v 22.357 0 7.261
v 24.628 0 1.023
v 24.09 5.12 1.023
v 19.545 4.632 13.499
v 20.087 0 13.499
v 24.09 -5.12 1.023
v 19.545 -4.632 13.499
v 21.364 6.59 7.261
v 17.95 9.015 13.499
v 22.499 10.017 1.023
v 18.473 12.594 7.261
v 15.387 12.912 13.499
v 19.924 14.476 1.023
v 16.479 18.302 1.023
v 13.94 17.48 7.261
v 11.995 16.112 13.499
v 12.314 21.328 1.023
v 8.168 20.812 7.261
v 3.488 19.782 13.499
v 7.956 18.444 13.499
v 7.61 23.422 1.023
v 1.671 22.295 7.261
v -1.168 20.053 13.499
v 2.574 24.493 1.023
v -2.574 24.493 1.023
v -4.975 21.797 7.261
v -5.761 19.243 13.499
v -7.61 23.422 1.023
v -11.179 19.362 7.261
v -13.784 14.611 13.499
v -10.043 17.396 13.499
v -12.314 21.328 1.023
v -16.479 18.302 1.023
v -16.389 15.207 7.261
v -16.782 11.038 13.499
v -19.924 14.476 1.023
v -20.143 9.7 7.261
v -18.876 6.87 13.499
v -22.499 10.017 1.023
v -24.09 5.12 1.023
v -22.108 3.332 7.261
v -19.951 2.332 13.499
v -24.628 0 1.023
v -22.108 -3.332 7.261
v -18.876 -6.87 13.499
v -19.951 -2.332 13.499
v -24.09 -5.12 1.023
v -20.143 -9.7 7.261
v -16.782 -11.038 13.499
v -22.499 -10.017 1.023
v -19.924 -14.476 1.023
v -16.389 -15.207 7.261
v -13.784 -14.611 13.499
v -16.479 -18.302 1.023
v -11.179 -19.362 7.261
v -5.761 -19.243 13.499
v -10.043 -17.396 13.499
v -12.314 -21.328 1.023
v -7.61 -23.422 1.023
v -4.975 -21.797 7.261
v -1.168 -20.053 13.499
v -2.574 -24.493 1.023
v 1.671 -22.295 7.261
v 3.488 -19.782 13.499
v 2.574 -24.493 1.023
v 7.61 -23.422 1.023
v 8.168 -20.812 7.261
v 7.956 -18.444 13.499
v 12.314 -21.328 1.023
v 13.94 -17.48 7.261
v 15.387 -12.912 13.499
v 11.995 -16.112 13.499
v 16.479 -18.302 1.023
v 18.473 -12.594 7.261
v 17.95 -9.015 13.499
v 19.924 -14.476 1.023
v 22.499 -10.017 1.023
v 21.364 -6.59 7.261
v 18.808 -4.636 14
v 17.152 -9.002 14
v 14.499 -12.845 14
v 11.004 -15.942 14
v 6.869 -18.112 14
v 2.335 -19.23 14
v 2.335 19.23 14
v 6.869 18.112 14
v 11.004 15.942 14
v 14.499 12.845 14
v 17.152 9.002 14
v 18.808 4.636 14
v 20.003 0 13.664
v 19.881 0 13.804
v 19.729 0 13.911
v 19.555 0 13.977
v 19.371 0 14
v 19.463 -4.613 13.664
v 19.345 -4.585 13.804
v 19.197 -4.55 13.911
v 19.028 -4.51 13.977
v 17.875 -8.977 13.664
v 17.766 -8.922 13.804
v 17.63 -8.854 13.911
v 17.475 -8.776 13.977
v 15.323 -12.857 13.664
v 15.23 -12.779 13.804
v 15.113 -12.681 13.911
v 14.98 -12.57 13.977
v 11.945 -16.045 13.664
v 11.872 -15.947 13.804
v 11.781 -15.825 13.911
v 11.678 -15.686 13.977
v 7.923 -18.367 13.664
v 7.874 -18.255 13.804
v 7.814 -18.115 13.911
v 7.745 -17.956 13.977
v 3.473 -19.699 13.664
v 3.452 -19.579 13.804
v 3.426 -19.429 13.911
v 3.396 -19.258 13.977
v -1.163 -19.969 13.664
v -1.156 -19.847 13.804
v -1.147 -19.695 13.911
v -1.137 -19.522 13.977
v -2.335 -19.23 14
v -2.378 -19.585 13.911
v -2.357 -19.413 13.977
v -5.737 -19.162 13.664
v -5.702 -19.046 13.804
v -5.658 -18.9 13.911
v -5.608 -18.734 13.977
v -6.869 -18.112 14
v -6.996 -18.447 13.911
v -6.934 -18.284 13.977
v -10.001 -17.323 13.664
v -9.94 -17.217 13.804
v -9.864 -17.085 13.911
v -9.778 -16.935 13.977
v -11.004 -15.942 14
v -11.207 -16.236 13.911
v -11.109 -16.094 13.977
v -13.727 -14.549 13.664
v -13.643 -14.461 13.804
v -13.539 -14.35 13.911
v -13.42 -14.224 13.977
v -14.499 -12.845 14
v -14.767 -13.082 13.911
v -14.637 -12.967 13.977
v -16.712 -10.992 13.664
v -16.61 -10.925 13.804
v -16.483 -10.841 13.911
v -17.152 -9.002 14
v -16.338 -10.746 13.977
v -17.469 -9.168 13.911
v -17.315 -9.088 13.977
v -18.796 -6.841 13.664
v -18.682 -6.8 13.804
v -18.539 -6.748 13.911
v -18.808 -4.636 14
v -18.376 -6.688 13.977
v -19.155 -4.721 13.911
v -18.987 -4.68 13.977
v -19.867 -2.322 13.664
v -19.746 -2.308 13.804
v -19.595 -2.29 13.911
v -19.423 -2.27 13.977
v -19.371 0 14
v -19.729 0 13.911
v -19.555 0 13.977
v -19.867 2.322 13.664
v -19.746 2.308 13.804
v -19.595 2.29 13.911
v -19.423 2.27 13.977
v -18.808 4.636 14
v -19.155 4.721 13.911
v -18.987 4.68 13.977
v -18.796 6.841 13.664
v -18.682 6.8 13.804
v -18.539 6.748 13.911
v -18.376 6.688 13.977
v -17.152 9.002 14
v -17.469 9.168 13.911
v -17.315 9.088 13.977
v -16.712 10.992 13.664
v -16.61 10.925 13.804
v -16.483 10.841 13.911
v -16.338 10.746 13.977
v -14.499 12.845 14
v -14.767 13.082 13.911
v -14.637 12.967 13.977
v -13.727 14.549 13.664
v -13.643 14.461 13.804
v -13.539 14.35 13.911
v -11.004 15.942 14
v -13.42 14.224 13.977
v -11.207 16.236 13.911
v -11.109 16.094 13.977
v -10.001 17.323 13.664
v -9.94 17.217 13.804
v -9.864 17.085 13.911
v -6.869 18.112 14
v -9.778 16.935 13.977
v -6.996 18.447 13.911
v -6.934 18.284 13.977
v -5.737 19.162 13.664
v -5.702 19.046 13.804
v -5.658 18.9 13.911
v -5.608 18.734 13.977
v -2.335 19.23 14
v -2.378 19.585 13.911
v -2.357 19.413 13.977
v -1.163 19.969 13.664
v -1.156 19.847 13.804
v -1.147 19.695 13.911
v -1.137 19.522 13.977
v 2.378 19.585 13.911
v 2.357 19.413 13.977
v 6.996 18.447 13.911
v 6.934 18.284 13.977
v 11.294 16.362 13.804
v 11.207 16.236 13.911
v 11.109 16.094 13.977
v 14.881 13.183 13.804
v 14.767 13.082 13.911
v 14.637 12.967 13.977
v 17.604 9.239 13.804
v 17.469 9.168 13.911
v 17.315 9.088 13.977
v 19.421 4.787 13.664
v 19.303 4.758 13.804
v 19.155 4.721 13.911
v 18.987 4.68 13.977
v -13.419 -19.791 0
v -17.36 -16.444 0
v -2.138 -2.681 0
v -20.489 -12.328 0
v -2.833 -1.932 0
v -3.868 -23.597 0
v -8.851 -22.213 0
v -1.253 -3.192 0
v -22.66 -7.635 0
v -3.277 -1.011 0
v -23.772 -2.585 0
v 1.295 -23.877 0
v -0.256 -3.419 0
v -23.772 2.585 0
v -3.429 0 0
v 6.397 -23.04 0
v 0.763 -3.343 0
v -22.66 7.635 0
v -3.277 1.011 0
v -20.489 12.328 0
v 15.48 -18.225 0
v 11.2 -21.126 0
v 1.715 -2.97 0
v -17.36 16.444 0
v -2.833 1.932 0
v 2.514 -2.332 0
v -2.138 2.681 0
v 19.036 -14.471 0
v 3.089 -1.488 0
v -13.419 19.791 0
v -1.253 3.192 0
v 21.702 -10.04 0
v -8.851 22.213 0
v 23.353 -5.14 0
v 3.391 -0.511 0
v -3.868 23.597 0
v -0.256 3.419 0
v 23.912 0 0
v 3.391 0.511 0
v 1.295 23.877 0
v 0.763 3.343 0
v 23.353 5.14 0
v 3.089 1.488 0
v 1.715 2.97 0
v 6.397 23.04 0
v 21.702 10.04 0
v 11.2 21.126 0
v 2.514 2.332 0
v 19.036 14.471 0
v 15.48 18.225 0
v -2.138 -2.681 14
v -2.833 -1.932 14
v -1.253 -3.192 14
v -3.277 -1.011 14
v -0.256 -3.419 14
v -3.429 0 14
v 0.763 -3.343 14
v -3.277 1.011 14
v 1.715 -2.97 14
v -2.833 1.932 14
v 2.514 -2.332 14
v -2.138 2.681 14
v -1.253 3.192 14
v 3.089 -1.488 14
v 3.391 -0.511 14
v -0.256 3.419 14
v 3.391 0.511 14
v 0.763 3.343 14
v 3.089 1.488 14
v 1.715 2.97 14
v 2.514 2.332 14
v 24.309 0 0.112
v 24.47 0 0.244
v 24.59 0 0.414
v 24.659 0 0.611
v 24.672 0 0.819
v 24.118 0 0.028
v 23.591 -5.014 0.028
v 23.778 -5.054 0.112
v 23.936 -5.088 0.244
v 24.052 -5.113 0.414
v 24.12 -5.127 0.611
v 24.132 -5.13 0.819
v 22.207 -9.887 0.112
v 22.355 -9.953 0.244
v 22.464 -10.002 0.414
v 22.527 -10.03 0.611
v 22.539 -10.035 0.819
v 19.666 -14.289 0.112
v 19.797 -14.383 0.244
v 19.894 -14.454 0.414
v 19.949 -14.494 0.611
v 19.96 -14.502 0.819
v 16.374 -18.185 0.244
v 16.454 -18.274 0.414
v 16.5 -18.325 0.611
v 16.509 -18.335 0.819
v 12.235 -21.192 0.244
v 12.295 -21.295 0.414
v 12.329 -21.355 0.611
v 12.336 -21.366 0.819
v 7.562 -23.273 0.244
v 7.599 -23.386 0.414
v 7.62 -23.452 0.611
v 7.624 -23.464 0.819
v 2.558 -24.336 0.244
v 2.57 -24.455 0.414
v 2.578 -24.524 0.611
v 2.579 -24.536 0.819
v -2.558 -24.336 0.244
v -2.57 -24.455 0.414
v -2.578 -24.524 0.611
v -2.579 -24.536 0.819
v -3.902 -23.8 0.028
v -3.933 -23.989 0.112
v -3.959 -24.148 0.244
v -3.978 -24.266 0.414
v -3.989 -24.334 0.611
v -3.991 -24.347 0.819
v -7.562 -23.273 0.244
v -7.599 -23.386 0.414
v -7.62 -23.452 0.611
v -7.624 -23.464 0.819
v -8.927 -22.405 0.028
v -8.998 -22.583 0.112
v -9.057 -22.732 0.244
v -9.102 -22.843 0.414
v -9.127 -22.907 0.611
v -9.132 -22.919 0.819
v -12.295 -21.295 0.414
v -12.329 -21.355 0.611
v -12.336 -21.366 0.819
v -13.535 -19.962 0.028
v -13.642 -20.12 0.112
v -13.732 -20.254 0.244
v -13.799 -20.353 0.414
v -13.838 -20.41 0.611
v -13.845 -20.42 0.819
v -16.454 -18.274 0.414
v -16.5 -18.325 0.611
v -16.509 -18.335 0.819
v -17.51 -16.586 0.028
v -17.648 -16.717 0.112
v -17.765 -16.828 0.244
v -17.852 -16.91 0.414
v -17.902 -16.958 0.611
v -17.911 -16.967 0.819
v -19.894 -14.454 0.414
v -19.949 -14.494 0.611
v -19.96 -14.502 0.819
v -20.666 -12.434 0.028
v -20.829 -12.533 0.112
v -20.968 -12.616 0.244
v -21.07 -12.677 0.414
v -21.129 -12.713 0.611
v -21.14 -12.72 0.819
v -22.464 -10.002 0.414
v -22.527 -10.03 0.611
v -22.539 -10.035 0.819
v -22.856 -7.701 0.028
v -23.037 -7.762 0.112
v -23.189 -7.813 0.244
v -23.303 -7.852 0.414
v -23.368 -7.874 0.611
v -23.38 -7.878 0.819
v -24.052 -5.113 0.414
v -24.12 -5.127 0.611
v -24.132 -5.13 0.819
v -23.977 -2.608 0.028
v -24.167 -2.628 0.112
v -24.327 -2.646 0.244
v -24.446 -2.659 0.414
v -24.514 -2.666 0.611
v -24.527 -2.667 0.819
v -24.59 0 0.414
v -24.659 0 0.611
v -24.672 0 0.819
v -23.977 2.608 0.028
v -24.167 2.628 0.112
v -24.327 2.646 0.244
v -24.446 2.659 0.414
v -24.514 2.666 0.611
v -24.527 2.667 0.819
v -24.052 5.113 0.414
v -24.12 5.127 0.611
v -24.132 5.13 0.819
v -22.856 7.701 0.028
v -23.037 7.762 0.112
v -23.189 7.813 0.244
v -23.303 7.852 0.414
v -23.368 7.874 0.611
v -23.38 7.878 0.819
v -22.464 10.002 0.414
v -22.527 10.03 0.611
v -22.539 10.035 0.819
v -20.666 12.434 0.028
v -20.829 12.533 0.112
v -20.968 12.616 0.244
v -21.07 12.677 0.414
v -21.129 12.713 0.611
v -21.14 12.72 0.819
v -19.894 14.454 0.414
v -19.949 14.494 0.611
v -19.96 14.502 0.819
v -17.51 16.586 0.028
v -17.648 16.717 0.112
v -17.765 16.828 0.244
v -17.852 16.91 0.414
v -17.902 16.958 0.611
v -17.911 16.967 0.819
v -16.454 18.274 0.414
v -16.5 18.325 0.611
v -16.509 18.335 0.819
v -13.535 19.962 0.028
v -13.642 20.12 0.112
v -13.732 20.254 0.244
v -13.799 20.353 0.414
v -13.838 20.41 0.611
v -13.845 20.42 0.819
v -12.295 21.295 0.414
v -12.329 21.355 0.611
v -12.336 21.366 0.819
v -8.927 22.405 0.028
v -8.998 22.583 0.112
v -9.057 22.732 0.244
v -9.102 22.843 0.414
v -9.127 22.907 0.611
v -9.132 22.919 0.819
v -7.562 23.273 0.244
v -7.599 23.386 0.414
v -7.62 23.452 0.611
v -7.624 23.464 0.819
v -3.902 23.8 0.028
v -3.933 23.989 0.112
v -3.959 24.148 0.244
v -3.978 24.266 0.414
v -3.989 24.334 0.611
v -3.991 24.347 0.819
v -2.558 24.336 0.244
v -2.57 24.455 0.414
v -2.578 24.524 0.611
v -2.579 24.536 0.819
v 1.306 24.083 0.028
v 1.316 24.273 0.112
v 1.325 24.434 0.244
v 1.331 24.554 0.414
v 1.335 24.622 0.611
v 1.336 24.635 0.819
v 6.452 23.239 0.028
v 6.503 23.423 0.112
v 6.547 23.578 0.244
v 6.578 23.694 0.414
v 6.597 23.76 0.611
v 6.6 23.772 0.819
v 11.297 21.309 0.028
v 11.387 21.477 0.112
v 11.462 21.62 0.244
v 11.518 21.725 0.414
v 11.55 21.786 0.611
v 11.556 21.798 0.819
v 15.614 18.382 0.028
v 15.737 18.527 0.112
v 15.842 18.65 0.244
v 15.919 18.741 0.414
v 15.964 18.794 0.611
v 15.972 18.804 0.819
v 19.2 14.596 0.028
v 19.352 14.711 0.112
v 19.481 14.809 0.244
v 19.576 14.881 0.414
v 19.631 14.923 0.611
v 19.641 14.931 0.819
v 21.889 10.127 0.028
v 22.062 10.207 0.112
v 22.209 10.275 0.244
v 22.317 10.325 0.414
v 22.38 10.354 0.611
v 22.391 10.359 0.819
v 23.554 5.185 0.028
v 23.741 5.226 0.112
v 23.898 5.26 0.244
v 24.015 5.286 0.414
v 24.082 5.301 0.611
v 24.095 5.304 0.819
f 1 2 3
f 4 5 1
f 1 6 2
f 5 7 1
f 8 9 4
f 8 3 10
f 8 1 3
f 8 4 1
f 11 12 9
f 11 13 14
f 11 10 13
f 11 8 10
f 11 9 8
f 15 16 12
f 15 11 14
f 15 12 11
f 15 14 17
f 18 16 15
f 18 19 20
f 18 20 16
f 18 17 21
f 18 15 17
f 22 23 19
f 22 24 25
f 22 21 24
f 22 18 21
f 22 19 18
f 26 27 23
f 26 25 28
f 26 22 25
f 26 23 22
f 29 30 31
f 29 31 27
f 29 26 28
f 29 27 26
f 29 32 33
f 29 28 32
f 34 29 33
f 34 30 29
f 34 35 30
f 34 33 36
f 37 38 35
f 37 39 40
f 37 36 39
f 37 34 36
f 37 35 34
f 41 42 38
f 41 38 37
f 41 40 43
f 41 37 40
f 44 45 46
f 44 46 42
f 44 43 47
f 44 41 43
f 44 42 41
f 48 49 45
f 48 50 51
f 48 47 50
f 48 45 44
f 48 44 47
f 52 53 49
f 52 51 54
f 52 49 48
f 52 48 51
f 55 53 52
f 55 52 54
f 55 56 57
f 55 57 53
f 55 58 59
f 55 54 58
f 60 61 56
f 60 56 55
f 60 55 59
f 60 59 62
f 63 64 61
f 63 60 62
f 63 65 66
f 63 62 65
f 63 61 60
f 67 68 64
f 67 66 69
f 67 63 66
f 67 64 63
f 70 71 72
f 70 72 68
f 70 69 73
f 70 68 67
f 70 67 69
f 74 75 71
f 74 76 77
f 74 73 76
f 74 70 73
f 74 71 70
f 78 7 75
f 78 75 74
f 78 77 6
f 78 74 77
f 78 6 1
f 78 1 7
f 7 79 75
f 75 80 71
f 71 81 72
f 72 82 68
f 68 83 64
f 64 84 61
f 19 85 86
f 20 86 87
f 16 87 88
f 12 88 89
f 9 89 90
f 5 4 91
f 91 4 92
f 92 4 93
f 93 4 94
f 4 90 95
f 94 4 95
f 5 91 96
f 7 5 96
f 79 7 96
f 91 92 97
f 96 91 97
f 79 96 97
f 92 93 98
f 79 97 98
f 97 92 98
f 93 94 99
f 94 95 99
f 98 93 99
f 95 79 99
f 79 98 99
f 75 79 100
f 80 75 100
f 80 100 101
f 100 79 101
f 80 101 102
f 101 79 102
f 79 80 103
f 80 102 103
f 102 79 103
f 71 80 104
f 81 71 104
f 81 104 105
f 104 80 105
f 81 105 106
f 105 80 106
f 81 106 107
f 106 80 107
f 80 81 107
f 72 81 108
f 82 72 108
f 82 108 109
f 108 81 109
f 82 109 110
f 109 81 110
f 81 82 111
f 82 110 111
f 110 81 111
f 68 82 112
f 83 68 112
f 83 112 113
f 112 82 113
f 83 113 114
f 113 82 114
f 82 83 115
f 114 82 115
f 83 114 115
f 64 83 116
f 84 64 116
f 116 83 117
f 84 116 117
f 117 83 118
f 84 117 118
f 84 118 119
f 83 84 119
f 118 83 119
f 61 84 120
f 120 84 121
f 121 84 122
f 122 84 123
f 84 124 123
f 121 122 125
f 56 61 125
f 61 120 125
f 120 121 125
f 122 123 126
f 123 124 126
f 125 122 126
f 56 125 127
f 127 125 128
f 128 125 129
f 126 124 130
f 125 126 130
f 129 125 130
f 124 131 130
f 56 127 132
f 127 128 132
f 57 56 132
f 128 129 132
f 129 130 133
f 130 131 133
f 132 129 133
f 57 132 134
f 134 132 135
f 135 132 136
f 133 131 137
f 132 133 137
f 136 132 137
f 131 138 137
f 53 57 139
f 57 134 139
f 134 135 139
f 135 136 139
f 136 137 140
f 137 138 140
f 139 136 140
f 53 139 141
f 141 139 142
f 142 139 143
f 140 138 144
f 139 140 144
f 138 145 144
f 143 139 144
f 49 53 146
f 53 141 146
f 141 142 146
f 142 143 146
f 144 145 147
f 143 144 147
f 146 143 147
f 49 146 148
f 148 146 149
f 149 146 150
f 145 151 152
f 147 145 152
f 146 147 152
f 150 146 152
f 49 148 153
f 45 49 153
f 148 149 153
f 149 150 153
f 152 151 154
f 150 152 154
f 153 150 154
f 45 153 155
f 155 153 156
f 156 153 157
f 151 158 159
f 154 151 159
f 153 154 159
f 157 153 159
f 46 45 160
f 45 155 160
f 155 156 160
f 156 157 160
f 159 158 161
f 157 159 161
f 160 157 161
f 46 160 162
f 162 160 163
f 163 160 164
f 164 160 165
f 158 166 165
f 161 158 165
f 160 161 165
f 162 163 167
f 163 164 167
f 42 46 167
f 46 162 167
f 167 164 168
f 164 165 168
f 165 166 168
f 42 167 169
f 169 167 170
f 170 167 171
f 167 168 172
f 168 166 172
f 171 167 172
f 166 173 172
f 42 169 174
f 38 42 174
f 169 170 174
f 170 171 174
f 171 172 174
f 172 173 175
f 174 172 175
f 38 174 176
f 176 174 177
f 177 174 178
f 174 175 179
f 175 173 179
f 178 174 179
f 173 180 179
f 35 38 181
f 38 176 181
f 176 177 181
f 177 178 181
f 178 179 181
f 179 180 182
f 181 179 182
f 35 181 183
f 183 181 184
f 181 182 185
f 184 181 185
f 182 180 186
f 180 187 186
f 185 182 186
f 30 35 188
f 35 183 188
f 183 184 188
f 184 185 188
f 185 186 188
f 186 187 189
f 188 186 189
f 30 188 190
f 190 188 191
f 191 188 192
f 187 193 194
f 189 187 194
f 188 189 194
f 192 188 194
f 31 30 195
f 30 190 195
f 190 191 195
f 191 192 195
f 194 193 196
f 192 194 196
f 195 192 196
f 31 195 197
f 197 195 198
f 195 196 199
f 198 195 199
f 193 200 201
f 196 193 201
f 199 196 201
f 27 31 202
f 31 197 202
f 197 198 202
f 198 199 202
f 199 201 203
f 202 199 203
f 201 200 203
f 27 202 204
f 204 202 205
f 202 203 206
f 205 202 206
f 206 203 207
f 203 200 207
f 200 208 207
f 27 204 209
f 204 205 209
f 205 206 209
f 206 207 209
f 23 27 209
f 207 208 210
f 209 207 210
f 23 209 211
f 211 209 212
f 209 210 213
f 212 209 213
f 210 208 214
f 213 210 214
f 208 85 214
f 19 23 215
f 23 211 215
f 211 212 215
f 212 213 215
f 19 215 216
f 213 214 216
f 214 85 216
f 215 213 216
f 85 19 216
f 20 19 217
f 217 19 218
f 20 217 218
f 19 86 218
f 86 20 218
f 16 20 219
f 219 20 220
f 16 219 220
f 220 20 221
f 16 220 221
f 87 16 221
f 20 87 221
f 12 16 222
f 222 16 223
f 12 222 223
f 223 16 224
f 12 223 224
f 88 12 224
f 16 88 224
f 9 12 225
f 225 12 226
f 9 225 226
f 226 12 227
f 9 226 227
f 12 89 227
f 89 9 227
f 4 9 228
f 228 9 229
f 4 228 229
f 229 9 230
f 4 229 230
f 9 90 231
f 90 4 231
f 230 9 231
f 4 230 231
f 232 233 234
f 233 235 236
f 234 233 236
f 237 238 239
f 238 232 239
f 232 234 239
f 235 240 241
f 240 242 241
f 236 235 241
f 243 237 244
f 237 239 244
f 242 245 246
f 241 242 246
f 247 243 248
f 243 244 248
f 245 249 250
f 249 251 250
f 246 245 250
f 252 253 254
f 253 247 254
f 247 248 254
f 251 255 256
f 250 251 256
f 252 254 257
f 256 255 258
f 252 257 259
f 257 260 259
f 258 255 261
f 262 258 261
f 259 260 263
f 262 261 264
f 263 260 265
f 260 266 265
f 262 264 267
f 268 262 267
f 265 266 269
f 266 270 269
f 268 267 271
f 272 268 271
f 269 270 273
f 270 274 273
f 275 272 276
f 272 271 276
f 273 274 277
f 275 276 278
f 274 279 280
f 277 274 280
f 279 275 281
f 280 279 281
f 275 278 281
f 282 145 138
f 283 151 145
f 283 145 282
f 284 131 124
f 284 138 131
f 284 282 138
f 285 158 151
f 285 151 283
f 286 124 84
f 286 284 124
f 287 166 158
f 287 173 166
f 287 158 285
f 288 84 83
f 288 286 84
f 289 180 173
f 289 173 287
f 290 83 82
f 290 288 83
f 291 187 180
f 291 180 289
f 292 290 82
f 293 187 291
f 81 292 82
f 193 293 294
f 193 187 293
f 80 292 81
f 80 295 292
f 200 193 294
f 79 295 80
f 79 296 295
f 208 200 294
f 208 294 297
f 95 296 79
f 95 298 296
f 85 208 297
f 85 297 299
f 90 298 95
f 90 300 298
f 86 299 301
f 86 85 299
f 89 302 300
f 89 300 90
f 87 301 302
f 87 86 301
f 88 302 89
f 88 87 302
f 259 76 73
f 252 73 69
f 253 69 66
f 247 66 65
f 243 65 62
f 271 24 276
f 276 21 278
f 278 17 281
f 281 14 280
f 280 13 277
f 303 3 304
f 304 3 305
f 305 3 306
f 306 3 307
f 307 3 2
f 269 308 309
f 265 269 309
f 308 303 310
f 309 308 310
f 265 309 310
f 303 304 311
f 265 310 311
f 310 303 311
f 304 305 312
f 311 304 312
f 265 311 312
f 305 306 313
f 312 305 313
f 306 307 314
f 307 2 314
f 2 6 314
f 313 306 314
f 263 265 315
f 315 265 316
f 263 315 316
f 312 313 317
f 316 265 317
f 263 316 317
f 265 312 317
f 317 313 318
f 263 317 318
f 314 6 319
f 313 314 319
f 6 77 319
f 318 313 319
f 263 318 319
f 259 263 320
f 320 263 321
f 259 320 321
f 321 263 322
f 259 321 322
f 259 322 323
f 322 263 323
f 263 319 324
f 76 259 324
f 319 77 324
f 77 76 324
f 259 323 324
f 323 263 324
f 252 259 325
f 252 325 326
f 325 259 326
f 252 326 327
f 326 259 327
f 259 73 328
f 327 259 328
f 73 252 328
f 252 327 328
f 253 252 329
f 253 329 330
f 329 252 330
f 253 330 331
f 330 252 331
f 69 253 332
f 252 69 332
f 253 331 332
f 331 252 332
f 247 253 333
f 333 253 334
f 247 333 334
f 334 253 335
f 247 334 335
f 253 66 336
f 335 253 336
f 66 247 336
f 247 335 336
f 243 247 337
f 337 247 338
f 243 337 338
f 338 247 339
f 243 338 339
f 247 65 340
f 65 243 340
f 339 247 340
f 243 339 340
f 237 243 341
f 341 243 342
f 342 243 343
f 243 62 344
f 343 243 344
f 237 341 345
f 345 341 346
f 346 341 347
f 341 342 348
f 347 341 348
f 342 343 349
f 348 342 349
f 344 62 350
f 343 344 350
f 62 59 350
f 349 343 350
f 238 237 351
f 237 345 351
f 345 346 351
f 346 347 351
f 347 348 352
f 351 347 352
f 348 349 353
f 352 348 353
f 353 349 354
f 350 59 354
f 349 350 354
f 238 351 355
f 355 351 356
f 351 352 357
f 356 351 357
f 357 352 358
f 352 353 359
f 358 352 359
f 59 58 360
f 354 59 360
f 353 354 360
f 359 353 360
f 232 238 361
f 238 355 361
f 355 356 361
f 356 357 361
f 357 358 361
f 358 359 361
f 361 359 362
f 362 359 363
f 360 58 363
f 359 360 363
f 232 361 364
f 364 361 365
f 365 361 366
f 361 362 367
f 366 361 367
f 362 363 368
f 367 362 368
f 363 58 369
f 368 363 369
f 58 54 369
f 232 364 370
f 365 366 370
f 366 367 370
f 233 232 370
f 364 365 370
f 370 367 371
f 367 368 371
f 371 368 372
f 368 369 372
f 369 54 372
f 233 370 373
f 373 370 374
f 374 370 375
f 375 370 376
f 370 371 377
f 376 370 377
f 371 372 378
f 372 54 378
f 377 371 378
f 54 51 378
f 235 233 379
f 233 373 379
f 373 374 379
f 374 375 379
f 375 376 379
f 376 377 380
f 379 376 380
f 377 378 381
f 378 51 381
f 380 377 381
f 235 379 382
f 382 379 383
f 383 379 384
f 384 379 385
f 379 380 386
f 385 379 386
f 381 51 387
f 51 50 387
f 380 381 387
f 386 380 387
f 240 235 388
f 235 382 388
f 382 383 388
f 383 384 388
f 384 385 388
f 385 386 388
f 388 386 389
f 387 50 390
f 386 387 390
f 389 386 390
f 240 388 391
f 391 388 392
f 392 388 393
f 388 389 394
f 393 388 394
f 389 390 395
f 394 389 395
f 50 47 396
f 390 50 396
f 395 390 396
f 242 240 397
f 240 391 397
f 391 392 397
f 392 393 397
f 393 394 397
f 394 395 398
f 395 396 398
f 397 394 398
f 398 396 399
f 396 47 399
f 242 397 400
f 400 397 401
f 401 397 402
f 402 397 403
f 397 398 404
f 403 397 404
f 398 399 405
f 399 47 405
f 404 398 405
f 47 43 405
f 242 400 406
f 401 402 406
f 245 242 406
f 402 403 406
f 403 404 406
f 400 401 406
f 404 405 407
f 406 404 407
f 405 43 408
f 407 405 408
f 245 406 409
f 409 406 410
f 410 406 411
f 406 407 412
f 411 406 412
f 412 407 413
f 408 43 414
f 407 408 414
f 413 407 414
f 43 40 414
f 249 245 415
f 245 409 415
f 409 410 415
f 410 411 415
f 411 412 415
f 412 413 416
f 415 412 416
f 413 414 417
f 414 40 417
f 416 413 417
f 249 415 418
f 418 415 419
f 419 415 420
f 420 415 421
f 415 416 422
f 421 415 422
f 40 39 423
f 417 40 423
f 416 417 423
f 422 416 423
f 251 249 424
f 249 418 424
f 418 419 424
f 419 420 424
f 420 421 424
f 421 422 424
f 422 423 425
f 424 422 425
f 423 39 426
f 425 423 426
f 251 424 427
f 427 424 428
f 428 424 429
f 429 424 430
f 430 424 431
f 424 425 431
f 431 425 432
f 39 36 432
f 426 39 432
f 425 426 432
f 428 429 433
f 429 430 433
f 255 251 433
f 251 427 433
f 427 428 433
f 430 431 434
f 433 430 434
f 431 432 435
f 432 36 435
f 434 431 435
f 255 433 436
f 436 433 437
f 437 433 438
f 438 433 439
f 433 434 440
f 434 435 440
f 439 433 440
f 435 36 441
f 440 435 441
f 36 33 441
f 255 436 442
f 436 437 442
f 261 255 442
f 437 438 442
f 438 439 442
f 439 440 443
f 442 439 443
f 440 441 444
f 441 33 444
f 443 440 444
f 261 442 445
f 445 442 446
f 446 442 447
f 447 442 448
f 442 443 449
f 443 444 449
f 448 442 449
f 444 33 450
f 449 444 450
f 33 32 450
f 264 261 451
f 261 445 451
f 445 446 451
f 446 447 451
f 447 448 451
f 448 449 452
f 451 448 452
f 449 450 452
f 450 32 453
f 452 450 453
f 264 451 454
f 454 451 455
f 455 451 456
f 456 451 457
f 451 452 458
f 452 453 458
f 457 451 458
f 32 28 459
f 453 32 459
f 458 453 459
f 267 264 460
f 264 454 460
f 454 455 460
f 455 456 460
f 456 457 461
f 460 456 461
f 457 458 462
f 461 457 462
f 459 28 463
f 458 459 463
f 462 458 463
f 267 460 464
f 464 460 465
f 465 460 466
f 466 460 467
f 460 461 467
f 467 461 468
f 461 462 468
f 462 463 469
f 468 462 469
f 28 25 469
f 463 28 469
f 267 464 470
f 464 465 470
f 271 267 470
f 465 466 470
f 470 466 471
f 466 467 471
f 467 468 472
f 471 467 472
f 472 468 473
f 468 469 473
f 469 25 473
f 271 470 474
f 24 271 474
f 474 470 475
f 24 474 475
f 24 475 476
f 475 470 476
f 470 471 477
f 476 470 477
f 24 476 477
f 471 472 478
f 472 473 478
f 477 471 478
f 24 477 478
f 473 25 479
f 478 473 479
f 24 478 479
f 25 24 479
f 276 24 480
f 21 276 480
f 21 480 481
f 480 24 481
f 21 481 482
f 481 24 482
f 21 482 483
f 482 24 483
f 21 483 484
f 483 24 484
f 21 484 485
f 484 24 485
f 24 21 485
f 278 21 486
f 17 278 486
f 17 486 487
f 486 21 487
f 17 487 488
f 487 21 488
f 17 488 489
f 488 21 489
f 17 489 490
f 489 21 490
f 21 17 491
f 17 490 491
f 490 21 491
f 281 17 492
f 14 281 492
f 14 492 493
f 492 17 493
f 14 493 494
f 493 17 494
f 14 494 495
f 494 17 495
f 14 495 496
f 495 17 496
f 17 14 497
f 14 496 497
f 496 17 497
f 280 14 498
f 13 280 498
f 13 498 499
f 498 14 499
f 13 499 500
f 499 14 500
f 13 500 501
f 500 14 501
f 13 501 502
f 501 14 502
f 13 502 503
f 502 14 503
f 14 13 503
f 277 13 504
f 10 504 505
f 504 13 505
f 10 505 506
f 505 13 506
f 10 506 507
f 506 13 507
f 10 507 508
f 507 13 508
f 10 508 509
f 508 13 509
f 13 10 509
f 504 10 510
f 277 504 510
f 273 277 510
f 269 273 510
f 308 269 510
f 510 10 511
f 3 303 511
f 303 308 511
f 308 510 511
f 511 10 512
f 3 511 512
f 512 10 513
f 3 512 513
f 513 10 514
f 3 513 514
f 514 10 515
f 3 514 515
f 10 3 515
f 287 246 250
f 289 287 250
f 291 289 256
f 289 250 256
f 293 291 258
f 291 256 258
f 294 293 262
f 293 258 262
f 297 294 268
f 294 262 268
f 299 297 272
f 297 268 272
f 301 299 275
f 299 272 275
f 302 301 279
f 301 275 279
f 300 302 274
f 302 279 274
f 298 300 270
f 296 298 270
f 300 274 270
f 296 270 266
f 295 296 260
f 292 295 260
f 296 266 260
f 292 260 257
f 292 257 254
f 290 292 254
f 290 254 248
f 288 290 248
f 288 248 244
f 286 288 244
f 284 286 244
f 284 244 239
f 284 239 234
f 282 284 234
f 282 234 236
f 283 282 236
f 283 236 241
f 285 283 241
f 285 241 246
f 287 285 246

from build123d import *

# Parameters (mm, degrees)
F0_R     = 25
F1_DEPTH = 14
F1_TAPER = 20
F3_D     = 6.858
F4_R     = 0.762


with BuildPart() as f1:
    # F0 (on Top) → F1 (new body)
    with BuildSketch(Plane.XY):
        Circle(F0_R)
    extrude(amount=F1_DEPTH, taper=F1_TAPER)

    # F3 (through all)
    with Locations(Plane.XY.offset(14)):
        with Locations((0, 0)):
            Hole(F3_D / 2)

    # F4
    f4_edges = [f1.edges().sort_by_distance(p)[0] for p in [
        (-19.904417, 0, 14),
        (-25, 0, 0),
    ]]
    fillet(f4_edges, radius=F4_R)


solid = f1.part
